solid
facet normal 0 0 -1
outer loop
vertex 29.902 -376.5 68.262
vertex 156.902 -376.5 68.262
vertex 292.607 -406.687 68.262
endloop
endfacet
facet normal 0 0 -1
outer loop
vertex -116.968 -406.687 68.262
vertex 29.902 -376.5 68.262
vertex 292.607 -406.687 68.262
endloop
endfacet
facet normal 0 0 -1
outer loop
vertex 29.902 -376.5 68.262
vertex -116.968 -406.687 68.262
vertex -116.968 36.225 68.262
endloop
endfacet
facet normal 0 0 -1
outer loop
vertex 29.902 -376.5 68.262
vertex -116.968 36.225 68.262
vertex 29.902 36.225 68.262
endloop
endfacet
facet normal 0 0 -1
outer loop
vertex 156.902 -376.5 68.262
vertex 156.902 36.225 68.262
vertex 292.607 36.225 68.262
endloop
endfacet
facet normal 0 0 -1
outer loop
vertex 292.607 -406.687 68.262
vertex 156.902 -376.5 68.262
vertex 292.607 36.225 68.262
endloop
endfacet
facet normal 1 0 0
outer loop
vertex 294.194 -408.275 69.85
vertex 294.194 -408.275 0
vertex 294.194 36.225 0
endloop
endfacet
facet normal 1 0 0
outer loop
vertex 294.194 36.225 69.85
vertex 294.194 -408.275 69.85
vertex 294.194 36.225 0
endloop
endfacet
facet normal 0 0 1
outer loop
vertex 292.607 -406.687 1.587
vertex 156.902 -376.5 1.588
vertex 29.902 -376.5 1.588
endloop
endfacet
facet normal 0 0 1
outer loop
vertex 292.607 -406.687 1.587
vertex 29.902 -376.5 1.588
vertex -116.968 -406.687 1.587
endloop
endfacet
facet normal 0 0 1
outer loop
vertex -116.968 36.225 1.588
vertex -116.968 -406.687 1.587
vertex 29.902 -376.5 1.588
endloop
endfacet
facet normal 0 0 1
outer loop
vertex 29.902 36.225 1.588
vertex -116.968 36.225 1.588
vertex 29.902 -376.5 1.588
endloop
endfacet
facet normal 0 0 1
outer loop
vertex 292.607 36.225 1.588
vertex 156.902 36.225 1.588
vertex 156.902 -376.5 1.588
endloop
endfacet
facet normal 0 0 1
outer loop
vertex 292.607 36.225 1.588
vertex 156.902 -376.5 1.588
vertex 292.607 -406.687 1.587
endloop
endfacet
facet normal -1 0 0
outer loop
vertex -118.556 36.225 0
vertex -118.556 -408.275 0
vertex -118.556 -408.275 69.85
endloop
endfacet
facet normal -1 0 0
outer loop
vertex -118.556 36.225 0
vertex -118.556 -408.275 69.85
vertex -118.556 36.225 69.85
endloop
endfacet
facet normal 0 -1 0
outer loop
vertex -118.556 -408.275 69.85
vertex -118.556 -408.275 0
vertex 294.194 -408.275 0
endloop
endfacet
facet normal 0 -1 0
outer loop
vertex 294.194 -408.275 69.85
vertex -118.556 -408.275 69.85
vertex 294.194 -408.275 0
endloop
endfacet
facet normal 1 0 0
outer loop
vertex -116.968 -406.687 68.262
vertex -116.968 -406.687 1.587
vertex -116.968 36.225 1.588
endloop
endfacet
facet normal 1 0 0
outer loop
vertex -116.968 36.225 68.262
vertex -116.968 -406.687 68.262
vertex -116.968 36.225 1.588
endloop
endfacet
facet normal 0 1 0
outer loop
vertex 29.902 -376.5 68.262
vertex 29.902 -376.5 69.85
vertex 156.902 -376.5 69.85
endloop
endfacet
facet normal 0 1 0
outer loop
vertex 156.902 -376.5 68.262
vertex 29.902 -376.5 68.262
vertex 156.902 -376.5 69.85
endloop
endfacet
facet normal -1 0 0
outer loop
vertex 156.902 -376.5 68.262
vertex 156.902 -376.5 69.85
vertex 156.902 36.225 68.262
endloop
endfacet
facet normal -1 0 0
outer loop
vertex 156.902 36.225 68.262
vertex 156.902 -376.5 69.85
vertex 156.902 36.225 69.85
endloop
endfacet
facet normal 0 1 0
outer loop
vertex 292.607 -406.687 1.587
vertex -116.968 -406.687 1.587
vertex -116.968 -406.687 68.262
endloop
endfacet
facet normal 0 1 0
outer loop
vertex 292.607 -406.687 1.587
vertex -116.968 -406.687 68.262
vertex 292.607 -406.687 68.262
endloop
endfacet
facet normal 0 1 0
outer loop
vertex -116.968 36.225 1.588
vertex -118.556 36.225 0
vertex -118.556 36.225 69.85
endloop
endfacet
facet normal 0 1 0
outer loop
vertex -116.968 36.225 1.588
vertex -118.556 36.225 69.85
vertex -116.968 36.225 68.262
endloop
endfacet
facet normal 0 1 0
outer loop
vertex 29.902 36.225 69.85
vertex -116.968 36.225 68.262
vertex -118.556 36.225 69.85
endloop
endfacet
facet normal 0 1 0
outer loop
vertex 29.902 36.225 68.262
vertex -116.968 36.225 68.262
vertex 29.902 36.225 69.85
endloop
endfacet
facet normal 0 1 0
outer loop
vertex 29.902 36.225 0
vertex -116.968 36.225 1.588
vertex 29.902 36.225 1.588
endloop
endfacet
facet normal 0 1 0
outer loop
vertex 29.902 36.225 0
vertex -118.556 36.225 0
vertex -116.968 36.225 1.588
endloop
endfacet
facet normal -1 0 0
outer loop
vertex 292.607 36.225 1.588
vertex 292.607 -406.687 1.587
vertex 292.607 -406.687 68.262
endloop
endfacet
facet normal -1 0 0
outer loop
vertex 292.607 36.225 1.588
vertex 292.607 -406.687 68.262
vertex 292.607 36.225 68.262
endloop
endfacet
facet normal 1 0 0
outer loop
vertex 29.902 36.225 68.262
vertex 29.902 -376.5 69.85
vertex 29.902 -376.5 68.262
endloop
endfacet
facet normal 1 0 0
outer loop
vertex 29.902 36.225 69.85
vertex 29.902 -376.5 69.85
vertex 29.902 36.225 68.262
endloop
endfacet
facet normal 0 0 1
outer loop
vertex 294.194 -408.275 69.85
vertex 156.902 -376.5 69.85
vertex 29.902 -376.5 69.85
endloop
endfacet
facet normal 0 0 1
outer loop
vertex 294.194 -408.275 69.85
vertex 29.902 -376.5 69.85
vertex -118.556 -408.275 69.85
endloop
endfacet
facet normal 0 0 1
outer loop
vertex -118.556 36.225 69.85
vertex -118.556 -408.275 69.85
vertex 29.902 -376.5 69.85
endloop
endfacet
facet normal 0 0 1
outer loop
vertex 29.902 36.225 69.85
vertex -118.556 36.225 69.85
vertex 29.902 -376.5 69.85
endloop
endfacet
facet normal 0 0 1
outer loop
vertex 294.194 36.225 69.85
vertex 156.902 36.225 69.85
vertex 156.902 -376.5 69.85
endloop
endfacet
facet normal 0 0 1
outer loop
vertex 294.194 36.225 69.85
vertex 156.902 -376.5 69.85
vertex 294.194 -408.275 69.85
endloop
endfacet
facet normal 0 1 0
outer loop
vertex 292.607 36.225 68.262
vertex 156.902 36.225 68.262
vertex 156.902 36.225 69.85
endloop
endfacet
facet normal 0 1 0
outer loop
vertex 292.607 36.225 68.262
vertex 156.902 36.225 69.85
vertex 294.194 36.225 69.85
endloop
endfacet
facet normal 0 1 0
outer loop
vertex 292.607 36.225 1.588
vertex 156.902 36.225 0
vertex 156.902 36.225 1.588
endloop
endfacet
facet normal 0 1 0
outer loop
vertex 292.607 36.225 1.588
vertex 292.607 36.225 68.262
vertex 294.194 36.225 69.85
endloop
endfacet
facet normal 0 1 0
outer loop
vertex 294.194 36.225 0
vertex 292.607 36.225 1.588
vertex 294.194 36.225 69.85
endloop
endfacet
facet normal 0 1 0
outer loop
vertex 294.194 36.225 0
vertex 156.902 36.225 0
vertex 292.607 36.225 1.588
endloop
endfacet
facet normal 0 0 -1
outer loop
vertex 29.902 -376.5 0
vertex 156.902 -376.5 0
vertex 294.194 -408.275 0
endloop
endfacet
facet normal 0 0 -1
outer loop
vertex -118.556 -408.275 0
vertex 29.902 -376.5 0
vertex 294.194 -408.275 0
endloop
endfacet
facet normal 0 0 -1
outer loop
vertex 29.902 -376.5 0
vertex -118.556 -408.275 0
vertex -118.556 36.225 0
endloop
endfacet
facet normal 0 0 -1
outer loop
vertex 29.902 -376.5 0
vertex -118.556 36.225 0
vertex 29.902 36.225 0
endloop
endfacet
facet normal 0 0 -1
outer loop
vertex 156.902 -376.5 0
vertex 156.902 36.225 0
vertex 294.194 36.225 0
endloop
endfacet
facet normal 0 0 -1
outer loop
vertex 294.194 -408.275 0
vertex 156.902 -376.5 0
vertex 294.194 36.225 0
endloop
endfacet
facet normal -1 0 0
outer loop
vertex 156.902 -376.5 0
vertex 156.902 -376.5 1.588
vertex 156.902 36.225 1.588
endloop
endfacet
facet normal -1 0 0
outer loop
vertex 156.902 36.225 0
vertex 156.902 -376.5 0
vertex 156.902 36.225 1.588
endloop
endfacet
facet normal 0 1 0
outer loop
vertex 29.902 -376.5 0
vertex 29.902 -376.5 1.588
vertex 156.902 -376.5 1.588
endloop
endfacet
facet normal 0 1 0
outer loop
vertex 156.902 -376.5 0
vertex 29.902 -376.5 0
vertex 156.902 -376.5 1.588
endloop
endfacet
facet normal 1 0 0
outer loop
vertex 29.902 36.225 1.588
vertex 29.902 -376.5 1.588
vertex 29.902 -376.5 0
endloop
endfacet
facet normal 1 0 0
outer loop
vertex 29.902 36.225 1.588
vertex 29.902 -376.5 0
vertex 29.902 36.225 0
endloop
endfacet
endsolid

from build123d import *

# Parameters (mm, degrees)
SKETCH2_W           = 412.75
SKETCH2_H           = 444.5
BOSS_EXTRUDE1_DEPTH = 69.85
SHELL1_T            = -1.5875
SKETCH4_W           = 127
SKETCH4_H           = 412.75
CUT_EXTRUDE1_DEPTH  = 69.85


with BuildPart() as part:
    # Sketch2 → Boss-Extrude1 (new body)
    with BuildSketch(Plane.XY):
        with Locations((87.819148936, -186.024601064)):
            Rectangle(SKETCH2_W, SKETCH2_H)
    extrude(amount=BOSS_EXTRUDE1_DEPTH)

    # Shell1
    shell1_openings = [part.faces().sort_by_distance(p)[0] for p in [
        (87.819148936, 36.225398936, 34.925),
    ]]
    offset(amount=SHELL1_T, openings=shell1_openings, kind=Kind.INTERSECTION)

    # Sketch4 → Cut-Extrude1 (cut)
    with BuildSketch(Plane.XY.offset(69.85)):
        with Locations((93.402369386, -170.125111794)):
            Rectangle(SKETCH4_W, SKETCH4_H)
    extrude(amount=-CUT_EXTRUDE1_DEPTH, mode=Mode.SUBTRACT)


solid = part.part
